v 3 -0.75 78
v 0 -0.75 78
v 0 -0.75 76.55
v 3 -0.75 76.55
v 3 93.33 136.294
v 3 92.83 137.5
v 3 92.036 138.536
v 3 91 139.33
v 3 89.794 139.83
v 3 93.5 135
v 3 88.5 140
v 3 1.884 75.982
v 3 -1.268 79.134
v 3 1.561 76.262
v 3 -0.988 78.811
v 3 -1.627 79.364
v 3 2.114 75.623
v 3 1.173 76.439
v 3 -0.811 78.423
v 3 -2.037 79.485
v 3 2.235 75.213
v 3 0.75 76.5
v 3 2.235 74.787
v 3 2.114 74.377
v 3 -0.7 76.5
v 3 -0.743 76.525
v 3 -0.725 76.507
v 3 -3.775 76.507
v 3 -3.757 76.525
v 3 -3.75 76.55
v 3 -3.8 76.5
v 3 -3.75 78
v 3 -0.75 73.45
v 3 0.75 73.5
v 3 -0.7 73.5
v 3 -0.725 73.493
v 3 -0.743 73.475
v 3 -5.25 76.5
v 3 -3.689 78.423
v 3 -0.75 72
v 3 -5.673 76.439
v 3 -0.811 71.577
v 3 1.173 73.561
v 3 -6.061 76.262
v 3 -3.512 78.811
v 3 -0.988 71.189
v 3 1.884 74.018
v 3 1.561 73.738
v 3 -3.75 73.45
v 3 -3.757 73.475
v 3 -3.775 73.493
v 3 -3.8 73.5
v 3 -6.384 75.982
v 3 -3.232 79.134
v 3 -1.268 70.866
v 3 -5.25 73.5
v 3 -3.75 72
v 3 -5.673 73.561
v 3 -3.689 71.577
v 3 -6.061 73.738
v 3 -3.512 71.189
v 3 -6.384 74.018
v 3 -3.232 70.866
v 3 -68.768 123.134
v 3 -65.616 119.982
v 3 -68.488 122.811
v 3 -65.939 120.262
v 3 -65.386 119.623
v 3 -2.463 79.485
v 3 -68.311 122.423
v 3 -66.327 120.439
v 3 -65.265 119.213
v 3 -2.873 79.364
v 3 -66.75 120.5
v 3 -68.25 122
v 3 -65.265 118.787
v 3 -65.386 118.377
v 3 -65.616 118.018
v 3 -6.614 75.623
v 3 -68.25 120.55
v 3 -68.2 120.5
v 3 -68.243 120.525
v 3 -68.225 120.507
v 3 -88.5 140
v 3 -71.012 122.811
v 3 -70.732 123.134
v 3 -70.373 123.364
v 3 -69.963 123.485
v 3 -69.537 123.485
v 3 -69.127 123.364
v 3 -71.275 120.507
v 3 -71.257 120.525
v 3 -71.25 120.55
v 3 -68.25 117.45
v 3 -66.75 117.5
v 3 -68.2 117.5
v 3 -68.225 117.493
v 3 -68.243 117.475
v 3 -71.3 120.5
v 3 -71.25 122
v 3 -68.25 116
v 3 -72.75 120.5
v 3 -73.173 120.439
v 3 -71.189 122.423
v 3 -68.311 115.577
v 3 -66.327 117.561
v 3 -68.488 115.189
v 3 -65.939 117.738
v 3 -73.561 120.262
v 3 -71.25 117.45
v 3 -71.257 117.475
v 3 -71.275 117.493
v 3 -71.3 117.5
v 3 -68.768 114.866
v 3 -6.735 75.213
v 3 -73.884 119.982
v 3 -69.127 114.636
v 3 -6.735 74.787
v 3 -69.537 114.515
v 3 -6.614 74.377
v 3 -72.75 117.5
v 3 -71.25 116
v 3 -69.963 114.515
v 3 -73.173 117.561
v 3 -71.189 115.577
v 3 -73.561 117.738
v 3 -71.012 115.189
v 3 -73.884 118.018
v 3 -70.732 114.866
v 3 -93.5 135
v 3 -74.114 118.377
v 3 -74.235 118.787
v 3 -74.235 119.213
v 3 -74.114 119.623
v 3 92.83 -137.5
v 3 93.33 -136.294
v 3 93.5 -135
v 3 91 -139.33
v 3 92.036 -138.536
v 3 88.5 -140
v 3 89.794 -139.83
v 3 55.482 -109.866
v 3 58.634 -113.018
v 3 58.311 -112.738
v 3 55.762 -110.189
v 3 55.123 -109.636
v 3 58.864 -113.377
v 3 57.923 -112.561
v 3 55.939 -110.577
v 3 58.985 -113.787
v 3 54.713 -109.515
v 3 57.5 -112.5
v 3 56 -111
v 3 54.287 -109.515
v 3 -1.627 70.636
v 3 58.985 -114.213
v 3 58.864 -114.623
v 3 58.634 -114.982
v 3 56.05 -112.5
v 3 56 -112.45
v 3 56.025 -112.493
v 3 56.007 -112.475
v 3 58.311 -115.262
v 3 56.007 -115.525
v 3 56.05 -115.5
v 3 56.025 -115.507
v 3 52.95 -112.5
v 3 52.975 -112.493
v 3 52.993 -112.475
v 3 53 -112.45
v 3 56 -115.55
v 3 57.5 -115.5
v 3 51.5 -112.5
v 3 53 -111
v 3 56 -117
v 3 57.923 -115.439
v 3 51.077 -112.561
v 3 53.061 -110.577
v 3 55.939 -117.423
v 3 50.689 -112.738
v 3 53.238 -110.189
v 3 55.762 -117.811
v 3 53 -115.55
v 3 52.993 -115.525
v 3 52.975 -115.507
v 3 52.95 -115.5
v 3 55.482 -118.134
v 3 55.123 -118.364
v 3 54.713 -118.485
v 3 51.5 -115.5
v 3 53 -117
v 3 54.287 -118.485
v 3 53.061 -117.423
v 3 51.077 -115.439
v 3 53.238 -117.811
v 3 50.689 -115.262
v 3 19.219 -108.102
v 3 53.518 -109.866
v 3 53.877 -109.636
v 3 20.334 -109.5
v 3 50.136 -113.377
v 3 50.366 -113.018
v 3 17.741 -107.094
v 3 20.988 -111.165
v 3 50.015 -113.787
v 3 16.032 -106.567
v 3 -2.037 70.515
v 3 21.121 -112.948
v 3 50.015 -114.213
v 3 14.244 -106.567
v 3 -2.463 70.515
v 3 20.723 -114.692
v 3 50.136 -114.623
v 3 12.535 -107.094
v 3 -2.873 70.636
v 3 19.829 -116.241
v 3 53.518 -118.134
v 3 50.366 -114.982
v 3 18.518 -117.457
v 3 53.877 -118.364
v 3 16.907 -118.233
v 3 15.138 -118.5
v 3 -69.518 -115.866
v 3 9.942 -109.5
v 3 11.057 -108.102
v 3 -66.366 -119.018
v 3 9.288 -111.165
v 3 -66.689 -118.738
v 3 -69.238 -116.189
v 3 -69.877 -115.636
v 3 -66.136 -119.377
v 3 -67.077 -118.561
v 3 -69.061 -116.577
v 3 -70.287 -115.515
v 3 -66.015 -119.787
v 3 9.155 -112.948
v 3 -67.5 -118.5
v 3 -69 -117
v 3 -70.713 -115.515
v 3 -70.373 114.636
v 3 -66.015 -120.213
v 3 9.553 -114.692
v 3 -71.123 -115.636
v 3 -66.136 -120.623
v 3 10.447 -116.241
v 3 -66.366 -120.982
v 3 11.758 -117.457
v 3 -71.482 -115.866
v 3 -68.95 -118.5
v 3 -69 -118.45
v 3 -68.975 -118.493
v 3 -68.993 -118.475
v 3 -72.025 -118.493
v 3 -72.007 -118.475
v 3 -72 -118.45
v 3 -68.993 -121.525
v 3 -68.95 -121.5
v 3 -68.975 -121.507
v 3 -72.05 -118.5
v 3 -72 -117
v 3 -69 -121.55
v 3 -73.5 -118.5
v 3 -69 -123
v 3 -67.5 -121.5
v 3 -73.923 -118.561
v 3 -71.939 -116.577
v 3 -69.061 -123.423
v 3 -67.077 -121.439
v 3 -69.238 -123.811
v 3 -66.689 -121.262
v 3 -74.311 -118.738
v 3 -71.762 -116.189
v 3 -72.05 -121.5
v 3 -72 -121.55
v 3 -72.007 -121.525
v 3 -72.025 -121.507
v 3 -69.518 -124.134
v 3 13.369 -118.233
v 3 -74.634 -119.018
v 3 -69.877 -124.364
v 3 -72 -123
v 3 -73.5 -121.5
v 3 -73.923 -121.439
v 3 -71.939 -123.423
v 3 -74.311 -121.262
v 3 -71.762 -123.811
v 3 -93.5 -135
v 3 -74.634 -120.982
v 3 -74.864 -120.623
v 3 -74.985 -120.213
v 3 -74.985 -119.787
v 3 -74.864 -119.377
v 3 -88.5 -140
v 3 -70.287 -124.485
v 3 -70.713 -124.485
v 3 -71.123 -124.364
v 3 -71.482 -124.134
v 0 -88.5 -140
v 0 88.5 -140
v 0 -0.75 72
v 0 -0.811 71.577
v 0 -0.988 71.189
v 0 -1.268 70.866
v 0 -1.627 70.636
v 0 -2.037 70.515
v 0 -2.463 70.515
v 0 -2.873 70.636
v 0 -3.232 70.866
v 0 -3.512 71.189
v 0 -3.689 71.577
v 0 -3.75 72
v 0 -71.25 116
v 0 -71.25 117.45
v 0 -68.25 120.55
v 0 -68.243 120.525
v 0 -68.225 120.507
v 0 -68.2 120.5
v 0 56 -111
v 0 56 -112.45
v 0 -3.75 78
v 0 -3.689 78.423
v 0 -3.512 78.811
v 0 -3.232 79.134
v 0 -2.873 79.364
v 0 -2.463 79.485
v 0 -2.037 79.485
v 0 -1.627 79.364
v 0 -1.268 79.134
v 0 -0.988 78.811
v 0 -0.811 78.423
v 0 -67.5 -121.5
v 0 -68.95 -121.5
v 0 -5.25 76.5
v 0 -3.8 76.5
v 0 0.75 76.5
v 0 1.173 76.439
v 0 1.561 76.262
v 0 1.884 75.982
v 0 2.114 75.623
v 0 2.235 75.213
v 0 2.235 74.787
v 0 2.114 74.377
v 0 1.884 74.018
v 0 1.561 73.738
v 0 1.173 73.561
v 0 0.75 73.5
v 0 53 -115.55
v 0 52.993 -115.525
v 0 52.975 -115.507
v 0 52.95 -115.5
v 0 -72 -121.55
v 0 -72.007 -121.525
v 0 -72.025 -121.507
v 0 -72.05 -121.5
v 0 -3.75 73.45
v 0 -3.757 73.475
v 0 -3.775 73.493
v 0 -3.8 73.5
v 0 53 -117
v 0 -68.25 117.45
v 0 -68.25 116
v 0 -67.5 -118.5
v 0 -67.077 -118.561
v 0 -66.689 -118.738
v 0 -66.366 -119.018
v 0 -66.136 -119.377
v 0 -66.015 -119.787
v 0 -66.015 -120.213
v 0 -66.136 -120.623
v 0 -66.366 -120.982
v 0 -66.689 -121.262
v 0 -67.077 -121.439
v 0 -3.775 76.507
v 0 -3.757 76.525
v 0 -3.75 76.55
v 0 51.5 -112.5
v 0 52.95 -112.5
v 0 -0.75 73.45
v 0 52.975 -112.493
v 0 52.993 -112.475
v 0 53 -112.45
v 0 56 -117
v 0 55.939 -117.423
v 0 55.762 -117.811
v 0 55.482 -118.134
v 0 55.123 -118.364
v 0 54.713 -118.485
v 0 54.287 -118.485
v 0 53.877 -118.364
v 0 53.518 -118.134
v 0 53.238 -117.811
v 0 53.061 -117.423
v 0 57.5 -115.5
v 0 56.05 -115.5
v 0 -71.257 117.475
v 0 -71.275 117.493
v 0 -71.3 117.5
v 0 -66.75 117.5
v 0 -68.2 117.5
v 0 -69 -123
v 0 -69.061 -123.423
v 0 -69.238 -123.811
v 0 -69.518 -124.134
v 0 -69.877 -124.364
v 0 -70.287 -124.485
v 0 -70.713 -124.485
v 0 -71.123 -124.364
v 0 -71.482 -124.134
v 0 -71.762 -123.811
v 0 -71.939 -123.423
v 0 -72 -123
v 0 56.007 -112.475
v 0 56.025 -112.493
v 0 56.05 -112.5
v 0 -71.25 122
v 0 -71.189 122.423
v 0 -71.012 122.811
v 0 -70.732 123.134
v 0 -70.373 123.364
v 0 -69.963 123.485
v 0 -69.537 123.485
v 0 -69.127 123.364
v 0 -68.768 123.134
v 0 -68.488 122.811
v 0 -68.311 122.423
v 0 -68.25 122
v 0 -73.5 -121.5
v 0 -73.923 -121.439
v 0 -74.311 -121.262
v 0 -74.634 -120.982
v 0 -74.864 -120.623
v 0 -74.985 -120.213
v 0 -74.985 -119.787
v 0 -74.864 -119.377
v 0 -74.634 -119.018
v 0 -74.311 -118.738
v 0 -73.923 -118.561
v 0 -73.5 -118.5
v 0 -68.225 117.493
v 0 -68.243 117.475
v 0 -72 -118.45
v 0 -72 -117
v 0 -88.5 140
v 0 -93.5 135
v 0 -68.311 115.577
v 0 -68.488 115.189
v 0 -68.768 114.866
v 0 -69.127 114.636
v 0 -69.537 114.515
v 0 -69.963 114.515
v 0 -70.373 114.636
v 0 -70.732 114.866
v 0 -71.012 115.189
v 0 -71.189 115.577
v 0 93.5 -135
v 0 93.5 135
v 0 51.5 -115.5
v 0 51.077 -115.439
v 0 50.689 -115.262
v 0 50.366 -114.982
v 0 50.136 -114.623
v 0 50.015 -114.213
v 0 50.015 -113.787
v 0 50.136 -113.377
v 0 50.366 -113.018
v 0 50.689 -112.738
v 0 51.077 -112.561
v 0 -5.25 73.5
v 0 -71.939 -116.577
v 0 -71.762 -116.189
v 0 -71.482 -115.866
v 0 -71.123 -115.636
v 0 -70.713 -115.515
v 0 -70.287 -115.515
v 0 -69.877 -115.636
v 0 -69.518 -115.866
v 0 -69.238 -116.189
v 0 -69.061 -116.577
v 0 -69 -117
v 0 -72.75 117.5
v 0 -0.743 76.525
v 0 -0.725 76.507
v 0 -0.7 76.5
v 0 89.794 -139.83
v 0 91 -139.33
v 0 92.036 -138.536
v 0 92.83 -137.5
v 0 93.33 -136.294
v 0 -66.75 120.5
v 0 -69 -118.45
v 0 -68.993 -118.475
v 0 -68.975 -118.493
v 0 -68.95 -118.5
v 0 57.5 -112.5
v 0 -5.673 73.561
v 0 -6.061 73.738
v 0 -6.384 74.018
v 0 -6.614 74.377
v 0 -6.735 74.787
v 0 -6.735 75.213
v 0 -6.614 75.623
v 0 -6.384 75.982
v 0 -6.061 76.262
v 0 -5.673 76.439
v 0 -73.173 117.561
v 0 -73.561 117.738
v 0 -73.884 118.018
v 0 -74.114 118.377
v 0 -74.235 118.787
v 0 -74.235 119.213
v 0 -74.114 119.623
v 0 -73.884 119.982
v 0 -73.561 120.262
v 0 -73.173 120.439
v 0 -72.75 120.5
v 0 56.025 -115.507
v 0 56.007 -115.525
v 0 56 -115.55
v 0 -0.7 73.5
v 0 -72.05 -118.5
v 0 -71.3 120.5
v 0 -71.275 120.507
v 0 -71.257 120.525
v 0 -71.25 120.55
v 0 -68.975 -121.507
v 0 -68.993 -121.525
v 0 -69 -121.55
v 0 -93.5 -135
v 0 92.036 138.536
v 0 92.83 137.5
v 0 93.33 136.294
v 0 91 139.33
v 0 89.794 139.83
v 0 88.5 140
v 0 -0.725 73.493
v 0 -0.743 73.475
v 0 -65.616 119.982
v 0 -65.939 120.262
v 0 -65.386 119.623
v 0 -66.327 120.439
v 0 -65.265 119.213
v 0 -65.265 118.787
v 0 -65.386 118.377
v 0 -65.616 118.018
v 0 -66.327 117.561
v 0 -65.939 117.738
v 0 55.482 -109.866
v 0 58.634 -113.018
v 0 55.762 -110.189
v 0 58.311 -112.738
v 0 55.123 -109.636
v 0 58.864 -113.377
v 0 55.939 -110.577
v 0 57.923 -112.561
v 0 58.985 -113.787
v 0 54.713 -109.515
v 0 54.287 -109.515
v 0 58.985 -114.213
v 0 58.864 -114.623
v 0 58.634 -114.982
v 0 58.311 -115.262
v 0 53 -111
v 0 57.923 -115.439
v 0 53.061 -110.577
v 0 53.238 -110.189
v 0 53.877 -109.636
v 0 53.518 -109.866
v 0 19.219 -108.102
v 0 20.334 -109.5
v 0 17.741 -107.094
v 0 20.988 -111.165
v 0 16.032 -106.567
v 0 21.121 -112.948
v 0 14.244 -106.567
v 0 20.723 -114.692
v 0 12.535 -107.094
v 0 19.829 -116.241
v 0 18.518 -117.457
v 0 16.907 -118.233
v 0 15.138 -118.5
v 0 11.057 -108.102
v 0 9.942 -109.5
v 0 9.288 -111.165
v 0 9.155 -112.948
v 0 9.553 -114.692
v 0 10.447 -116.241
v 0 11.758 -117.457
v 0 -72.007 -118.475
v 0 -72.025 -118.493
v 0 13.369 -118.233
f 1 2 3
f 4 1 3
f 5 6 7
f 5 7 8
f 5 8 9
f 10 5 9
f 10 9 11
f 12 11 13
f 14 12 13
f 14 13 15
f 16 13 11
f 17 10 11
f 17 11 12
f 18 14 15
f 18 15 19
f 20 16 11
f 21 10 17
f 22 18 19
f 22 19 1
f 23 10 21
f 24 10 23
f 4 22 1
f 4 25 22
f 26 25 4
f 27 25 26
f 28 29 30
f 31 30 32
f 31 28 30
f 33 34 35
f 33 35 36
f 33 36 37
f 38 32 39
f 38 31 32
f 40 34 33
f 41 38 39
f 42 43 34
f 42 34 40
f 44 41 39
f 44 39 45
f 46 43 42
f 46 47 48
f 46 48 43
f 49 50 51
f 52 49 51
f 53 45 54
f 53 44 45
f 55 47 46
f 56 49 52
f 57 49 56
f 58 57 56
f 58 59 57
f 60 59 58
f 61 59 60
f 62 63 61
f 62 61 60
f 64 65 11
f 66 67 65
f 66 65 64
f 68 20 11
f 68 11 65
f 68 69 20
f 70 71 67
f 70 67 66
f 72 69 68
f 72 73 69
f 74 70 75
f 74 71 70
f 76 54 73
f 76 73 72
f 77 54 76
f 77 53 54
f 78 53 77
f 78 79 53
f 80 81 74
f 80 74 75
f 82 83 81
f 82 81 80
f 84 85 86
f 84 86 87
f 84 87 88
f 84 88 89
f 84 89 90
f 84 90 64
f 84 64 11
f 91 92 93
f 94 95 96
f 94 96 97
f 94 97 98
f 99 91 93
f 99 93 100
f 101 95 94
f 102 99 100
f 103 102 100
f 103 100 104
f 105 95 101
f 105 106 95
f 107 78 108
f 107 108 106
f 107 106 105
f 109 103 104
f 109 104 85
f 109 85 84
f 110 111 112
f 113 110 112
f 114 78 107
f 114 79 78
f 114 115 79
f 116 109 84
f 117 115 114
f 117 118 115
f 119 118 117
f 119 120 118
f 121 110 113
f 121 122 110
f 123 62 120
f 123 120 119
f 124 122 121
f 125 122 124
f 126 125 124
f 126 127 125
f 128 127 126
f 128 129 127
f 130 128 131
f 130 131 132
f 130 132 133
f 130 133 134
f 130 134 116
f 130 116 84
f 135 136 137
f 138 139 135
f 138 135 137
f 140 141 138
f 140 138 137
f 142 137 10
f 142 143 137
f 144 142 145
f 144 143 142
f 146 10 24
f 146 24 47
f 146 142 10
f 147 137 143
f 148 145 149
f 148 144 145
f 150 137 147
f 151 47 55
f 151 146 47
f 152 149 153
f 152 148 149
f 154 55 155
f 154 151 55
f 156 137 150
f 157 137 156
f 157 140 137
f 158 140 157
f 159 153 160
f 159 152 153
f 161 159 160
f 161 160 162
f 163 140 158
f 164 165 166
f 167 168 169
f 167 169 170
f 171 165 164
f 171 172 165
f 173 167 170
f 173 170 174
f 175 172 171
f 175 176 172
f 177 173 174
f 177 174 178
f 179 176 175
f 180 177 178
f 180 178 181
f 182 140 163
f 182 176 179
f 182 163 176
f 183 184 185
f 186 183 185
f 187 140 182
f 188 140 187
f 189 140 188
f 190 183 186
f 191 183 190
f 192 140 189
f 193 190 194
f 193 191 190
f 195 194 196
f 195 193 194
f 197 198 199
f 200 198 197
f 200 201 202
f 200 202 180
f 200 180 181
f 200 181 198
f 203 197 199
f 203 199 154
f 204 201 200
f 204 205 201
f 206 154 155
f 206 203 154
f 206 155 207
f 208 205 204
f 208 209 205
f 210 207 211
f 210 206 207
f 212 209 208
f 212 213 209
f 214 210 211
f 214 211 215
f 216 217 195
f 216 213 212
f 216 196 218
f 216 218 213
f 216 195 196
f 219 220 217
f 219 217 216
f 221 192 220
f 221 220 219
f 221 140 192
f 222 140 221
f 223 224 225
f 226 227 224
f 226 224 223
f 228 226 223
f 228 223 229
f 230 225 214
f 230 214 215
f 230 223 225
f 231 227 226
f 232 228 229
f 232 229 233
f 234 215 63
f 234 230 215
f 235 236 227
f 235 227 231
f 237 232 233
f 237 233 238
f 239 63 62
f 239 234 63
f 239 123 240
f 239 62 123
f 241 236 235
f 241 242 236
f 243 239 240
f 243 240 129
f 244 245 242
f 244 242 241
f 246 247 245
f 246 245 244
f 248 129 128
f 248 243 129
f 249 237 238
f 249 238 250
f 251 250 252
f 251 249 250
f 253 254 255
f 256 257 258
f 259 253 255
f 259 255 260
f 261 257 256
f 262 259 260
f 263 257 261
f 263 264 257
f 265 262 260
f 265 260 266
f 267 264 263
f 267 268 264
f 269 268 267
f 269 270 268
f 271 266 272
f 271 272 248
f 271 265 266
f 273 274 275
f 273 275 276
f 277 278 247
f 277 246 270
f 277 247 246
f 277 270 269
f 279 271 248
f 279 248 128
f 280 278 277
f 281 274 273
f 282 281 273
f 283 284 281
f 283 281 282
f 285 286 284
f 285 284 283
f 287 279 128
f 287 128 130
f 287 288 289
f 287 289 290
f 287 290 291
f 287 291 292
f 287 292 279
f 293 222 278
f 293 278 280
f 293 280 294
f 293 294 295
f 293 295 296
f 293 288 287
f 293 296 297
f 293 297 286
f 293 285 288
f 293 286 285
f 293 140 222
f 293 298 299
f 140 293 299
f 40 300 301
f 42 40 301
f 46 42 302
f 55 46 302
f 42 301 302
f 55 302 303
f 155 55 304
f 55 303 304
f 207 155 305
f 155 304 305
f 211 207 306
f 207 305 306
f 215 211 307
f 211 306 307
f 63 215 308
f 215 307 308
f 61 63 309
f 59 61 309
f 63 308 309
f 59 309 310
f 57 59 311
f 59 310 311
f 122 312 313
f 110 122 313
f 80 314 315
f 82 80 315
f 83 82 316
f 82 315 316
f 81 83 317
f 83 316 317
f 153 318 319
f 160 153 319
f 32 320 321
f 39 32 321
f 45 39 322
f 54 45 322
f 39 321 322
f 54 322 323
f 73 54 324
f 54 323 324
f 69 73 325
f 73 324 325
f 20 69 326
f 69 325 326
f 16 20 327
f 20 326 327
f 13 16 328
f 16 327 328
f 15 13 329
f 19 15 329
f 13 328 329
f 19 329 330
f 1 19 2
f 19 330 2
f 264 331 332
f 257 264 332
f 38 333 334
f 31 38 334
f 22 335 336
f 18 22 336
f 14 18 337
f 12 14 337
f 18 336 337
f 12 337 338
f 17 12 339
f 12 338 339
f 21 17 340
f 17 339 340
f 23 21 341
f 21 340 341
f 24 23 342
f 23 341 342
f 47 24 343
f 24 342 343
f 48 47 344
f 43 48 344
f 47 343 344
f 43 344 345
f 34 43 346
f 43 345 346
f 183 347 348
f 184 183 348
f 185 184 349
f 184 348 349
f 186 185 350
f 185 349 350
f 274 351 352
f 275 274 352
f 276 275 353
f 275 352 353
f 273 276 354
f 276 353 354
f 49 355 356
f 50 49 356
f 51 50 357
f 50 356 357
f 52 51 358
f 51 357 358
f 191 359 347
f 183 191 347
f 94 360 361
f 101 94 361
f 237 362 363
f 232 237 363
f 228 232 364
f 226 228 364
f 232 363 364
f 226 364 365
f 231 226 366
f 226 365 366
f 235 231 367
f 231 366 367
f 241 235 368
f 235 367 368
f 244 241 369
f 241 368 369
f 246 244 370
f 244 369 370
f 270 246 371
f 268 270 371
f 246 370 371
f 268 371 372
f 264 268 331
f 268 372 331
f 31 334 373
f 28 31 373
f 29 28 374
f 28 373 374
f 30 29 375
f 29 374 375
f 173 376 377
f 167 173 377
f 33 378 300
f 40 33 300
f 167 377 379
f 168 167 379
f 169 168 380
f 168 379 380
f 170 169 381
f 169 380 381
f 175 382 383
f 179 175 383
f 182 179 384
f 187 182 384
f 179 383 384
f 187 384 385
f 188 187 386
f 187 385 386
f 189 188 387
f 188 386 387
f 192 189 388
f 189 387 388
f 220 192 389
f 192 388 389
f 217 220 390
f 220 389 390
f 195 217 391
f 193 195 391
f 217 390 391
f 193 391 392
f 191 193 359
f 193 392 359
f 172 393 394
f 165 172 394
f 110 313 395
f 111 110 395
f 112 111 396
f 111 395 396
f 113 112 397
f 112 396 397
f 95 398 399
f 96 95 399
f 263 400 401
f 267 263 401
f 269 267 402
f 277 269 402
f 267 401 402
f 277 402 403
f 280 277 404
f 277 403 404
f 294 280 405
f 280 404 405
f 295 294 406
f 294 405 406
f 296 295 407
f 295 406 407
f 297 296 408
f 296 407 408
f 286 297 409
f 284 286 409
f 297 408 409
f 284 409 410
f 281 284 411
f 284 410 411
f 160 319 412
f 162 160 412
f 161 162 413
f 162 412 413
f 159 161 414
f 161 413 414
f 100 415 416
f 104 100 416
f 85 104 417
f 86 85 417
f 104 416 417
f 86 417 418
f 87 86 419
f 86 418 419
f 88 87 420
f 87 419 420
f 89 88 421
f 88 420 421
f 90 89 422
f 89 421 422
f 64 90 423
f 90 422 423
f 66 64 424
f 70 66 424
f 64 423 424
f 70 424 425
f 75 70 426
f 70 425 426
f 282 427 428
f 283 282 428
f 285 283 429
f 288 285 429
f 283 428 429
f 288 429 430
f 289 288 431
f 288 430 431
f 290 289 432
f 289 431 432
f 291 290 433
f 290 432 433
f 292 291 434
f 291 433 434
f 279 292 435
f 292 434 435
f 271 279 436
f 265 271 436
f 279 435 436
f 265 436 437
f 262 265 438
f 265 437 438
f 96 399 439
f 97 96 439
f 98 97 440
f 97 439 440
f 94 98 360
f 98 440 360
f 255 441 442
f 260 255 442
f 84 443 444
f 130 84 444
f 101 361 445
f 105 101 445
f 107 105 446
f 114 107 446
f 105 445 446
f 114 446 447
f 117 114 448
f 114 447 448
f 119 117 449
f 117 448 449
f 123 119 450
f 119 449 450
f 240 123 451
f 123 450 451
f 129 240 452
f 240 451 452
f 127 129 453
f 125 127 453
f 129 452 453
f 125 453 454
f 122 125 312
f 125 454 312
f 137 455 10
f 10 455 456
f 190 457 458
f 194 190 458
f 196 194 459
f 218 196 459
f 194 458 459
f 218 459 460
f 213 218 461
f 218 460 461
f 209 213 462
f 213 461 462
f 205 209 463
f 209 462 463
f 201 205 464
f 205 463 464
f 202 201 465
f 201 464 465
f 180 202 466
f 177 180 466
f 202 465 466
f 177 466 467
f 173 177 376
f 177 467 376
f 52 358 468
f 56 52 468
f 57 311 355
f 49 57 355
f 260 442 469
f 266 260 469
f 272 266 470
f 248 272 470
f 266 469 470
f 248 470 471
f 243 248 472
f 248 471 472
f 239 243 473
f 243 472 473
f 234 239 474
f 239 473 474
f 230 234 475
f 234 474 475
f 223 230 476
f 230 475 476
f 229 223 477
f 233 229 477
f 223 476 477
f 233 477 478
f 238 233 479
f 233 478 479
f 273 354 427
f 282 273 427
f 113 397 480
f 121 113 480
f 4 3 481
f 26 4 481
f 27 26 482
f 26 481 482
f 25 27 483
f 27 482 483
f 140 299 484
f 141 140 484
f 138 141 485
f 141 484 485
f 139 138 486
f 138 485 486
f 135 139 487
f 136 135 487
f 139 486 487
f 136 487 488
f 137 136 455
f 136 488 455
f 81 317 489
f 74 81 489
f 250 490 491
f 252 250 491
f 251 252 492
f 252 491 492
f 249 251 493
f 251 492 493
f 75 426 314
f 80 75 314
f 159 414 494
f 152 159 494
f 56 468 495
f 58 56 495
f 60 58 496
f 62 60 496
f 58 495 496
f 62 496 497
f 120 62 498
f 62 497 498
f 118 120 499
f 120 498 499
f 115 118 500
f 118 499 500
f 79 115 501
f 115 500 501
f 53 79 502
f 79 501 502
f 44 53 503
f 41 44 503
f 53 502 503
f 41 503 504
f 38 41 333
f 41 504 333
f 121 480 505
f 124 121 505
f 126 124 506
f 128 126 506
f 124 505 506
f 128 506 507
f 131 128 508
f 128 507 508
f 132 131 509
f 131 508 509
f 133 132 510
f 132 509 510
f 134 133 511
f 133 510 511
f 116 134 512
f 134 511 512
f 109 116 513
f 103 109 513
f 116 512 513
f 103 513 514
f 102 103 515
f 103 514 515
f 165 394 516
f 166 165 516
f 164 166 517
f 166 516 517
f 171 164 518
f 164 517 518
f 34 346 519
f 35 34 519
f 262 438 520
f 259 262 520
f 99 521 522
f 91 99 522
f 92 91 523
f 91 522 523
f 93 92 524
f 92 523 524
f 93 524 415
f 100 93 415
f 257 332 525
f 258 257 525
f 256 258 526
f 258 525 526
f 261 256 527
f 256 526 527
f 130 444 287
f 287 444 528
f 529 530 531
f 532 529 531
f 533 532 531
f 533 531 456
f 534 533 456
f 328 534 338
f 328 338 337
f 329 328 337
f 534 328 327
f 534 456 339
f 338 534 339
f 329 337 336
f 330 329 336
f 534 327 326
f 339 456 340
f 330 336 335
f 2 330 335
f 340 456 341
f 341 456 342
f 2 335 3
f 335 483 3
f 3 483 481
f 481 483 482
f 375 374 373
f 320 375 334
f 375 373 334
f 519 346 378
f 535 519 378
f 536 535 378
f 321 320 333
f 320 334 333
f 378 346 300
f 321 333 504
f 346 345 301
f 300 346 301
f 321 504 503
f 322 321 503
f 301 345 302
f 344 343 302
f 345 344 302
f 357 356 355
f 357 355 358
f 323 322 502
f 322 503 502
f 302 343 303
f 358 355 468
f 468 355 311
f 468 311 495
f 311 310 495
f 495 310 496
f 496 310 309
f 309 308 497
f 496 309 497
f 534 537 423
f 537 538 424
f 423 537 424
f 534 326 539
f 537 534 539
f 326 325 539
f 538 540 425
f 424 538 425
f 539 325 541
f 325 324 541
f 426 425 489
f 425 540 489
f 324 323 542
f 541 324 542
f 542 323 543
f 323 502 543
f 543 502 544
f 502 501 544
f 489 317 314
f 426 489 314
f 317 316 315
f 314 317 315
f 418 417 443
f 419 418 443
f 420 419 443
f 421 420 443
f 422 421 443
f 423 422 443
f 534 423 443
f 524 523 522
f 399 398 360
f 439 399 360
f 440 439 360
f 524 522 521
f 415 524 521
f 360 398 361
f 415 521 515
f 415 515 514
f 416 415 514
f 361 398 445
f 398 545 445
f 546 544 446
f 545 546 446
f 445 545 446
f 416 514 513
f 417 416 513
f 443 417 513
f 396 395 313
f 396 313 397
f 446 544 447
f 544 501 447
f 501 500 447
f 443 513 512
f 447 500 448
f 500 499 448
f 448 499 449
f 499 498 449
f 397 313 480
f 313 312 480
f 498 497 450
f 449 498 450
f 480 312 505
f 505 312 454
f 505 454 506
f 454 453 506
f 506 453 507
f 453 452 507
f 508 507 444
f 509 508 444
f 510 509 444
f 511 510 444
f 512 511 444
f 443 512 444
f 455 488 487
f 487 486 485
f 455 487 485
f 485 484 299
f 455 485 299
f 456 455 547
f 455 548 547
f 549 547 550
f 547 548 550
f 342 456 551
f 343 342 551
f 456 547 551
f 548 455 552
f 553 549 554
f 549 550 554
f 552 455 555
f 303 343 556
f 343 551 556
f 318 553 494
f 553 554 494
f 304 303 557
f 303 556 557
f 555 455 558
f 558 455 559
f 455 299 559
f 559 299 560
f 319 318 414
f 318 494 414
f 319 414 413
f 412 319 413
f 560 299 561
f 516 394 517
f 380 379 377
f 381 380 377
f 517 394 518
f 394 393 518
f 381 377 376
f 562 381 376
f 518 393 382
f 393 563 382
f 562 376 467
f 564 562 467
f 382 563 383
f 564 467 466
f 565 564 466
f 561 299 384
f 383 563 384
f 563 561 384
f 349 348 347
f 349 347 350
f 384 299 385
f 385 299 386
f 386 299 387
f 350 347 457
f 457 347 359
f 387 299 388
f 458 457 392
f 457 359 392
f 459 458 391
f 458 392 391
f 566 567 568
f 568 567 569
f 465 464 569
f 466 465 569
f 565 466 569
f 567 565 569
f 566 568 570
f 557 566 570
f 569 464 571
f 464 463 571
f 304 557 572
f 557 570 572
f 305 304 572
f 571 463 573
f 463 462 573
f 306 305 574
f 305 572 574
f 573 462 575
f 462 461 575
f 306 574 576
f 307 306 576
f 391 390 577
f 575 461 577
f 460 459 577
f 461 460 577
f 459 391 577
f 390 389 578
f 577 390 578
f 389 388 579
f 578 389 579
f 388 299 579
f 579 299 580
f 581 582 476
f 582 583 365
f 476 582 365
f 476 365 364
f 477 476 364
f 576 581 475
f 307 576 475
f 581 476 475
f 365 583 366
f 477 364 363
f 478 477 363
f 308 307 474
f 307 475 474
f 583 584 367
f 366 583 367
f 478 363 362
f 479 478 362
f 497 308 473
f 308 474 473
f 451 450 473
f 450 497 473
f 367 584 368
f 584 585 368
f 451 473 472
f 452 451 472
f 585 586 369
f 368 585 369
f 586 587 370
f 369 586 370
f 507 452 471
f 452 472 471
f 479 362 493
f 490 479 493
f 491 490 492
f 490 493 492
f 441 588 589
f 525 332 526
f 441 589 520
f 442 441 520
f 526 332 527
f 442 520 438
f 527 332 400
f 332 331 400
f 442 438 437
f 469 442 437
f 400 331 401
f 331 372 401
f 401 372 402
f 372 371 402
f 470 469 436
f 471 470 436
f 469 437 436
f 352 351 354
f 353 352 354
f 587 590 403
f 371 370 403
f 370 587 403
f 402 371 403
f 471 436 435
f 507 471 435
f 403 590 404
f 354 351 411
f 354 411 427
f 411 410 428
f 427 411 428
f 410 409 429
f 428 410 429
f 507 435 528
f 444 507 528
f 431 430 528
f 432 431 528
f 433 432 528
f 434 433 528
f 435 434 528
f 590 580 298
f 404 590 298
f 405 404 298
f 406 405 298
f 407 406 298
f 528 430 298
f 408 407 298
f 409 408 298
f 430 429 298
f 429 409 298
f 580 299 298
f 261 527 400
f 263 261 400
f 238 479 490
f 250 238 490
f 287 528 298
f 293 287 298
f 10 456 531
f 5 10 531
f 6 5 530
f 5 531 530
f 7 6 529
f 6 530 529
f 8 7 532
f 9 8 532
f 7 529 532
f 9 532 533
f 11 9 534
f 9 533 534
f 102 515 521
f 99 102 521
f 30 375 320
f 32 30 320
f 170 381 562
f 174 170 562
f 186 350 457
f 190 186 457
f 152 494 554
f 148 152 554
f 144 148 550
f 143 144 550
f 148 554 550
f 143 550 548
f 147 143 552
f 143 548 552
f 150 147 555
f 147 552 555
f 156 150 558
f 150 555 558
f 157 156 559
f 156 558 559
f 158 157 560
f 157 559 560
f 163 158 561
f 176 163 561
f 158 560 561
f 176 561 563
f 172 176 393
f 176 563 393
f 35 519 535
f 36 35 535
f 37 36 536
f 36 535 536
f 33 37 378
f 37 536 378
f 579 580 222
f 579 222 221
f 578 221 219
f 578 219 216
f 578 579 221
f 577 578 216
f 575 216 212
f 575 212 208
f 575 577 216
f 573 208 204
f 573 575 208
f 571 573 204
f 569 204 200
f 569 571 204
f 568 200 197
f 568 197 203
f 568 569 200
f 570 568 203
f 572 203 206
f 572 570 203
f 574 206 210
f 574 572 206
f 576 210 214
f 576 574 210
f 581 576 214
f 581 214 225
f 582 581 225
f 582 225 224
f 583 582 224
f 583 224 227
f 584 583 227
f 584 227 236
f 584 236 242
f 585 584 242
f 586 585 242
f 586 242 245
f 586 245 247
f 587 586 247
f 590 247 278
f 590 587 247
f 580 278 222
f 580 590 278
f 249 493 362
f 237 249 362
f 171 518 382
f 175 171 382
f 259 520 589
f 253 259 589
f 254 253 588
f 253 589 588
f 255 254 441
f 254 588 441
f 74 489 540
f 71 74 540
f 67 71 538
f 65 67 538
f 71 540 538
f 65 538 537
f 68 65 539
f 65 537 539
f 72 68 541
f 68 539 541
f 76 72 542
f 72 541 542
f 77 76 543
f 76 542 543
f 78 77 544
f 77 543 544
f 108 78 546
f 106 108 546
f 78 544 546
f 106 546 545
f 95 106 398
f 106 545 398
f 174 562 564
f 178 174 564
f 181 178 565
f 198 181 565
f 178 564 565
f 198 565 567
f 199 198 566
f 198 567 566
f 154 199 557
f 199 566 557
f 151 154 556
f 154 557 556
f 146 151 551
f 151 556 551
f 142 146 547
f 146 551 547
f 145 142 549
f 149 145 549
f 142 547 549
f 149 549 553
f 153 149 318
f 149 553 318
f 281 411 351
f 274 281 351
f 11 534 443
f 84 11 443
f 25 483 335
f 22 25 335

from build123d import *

# Parameters (mm, degrees)
SKETCH1_R           = 6
BOSS_EXTRUDE1_DEPTH = 3


with BuildPart() as part:
    # Sketch1 → Boss-Extrude1 (new body)
    with BuildSketch(Plane(origin=(0, 0, 0), x_dir=(0, -1, 0), z_dir=(1, 0, 0))):
        with BuildLine():
            Line((-93.5, 135), (-93.5, -135))
            ThreePointArc((-93.5, -135), (-92.035533906, -138.535533906), (-88.5, -140))
            Line((-88.5, -140), (88.5, -140))
            Line((88.5, -140), (93.5, -135))
            Line((93.5, -135), (93.5, 135))
            Line((93.5, 135), (88.5, 140))
            Line((88.5, 140), (-88.5, 140))
            ThreePointArc((-88.5, 140), (-92.035533906, 138.535533906), (-93.5, 135))
        make_face()
        with Locations(Location((-15.138013541, 112.5, 0), (0, 0, 90))):
            Circle(SKETCH1_R, mode=Mode.SUBTRACT)
        with BuildLine():
            Line((-52.95, 115.5), (-51.5, 115.5))
            ThreePointArc((-51.5, 115.5), (-50, 114), (-51.5, 112.5))
            Line((-51.5, 112.5), (-52.95, 112.5))
            ThreePointArc((-52.95, 112.5), (-52.985355339, 112.485355339), (-53, 112.45))
            Line((-53, 112.45), (-53, 111))
            ThreePointArc((-53, 111), (-54.5, 109.5), (-56, 111))
            Line((-56, 111), (-56, 112.45))
            ThreePointArc((-56, 112.45), (-56.014644661, 112.485355339), (-56.05, 112.5))
            Line((-56.05, 112.5), (-57.5, 112.5))
            ThreePointArc((-57.5, 112.5), (-59, 114), (-57.5, 115.5))
            Line((-57.5, 115.5), (-56.05, 115.5))
            ThreePointArc((-56.05, 115.5), (-56.014644661, 115.514644661), (-56, 115.55))
            Line((-56, 115.55), (-56, 117))
            ThreePointArc((-56, 117), (-54.5, 118.5), (-53, 117))
            Line((-53, 117), (-53, 115.55))
            ThreePointArc((-53, 115.55), (-52.985355339, 115.514644661), (-52.95, 115.5))
        make_face(mode=Mode.SUBTRACT)
        with BuildLine():
            Line((67.5, 121.5), (68.95, 121.5))
            ThreePointArc((68.95, 121.5), (68.985355339, 121.514644661), (69, 121.55))
            Line((69, 121.55), (69, 123))
            ThreePointArc((69, 123), (70.5, 124.5), (72, 123))
            Line((72, 123), (72, 121.55))
            ThreePointArc((72, 121.55), (72.014644661, 121.514644661), (72.05, 121.5))
            Line((72.05, 121.5), (73.5, 121.5))
            ThreePointArc((73.5, 121.5), (75, 120), (73.5, 118.5))
            Line((73.5, 118.5), (72.05, 118.5))
            ThreePointArc((72.05, 118.5), (72.014644661, 118.485355339), (72, 118.45))
            Line((72, 118.45), (72, 117))
            ThreePointArc((72, 117), (70.5, 115.5), (69, 117))
            Line((69, 117), (69, 118.45))
            ThreePointArc((69, 118.45), (68.985355339, 118.485355339), (68.95, 118.5))
            Line((68.95, 118.5), (67.5, 118.5))
            ThreePointArc((67.5, 118.5), (66, 120), (67.5, 121.5))
        make_face(mode=Mode.SUBTRACT)
        with BuildLine():
            Line((3.75, -72), (3.75, -73.45))
            ThreePointArc((3.75, -73.45), (3.764644661, -73.485355339), (3.8, -73.5))
            Line((3.8, -73.5), (5.25, -73.5))
            ThreePointArc((5.25, -73.5), (6.75, -75), (5.25, -76.5))
            Line((5.25, -76.5), (3.8, -76.5))
            ThreePointArc((3.8, -76.5), (3.764644661, -76.514644661), (3.75, -76.55))
            Line((3.75, -76.55), (3.75, -78))
            ThreePointArc((3.75, -78), (2.25, -79.5), (0.75, -78))
            Line((0.75, -78), (0.75, -76.55))
            ThreePointArc((0.75, -76.55), (0.735355339, -76.514644661), (0.7, -76.5))
            Line((0.7, -76.5), (-0.75, -76.5))
            ThreePointArc((-0.75, -76.5), (-2.25, -75), (-0.75, -73.5))
            Line((-0.75, -73.5), (0.7, -73.5))
            ThreePointArc((0.7, -73.5), (0.735355339, -73.485355339), (0.75, -73.45))
            Line((0.75, -73.45), (0.75, -72))
            ThreePointArc((0.75, -72), (2.25, -70.5), (3.75, -72))
        make_face(mode=Mode.SUBTRACT)
        with BuildLine():
            Line((71.25, -116), (71.25, -117.45))
            ThreePointArc((71.25, -117.45), (71.264644661, -117.485355339), (71.3, -117.5))
            Line((71.3, -117.5), (72.75, -117.5))
            ThreePointArc((72.75, -117.5), (74.25, -119), (72.75, -120.5))
            Line((72.75, -120.5), (71.3, -120.5))
            ThreePointArc((71.3, -120.5), (71.264644661, -120.514644661), (71.25, -120.55))
            Line((71.25, -120.55), (71.25, -122))
            ThreePointArc((71.25, -122), (69.75, -123.5), (68.25, -122))
            Line((68.25, -122), (68.25, -120.55))
            ThreePointArc((68.25, -120.55), (68.235355339, -120.514644661), (68.2, -120.5))
            Line((68.2, -120.5), (66.75, -120.5))
            ThreePointArc((66.75, -120.5), (65.25, -119), (66.75, -117.5))
            Line((66.75, -117.5), (68.2, -117.5))
            ThreePointArc((68.2, -117.5), (68.235355339, -117.485355339), (68.25, -117.45))
            Line((68.25, -117.45), (68.25, -116))
            ThreePointArc((68.25, -116), (69.75, -114.5), (71.25, -116))
        make_face(mode=Mode.SUBTRACT)
    extrude(amount=BOSS_EXTRUDE1_DEPTH)


solid = part.part
